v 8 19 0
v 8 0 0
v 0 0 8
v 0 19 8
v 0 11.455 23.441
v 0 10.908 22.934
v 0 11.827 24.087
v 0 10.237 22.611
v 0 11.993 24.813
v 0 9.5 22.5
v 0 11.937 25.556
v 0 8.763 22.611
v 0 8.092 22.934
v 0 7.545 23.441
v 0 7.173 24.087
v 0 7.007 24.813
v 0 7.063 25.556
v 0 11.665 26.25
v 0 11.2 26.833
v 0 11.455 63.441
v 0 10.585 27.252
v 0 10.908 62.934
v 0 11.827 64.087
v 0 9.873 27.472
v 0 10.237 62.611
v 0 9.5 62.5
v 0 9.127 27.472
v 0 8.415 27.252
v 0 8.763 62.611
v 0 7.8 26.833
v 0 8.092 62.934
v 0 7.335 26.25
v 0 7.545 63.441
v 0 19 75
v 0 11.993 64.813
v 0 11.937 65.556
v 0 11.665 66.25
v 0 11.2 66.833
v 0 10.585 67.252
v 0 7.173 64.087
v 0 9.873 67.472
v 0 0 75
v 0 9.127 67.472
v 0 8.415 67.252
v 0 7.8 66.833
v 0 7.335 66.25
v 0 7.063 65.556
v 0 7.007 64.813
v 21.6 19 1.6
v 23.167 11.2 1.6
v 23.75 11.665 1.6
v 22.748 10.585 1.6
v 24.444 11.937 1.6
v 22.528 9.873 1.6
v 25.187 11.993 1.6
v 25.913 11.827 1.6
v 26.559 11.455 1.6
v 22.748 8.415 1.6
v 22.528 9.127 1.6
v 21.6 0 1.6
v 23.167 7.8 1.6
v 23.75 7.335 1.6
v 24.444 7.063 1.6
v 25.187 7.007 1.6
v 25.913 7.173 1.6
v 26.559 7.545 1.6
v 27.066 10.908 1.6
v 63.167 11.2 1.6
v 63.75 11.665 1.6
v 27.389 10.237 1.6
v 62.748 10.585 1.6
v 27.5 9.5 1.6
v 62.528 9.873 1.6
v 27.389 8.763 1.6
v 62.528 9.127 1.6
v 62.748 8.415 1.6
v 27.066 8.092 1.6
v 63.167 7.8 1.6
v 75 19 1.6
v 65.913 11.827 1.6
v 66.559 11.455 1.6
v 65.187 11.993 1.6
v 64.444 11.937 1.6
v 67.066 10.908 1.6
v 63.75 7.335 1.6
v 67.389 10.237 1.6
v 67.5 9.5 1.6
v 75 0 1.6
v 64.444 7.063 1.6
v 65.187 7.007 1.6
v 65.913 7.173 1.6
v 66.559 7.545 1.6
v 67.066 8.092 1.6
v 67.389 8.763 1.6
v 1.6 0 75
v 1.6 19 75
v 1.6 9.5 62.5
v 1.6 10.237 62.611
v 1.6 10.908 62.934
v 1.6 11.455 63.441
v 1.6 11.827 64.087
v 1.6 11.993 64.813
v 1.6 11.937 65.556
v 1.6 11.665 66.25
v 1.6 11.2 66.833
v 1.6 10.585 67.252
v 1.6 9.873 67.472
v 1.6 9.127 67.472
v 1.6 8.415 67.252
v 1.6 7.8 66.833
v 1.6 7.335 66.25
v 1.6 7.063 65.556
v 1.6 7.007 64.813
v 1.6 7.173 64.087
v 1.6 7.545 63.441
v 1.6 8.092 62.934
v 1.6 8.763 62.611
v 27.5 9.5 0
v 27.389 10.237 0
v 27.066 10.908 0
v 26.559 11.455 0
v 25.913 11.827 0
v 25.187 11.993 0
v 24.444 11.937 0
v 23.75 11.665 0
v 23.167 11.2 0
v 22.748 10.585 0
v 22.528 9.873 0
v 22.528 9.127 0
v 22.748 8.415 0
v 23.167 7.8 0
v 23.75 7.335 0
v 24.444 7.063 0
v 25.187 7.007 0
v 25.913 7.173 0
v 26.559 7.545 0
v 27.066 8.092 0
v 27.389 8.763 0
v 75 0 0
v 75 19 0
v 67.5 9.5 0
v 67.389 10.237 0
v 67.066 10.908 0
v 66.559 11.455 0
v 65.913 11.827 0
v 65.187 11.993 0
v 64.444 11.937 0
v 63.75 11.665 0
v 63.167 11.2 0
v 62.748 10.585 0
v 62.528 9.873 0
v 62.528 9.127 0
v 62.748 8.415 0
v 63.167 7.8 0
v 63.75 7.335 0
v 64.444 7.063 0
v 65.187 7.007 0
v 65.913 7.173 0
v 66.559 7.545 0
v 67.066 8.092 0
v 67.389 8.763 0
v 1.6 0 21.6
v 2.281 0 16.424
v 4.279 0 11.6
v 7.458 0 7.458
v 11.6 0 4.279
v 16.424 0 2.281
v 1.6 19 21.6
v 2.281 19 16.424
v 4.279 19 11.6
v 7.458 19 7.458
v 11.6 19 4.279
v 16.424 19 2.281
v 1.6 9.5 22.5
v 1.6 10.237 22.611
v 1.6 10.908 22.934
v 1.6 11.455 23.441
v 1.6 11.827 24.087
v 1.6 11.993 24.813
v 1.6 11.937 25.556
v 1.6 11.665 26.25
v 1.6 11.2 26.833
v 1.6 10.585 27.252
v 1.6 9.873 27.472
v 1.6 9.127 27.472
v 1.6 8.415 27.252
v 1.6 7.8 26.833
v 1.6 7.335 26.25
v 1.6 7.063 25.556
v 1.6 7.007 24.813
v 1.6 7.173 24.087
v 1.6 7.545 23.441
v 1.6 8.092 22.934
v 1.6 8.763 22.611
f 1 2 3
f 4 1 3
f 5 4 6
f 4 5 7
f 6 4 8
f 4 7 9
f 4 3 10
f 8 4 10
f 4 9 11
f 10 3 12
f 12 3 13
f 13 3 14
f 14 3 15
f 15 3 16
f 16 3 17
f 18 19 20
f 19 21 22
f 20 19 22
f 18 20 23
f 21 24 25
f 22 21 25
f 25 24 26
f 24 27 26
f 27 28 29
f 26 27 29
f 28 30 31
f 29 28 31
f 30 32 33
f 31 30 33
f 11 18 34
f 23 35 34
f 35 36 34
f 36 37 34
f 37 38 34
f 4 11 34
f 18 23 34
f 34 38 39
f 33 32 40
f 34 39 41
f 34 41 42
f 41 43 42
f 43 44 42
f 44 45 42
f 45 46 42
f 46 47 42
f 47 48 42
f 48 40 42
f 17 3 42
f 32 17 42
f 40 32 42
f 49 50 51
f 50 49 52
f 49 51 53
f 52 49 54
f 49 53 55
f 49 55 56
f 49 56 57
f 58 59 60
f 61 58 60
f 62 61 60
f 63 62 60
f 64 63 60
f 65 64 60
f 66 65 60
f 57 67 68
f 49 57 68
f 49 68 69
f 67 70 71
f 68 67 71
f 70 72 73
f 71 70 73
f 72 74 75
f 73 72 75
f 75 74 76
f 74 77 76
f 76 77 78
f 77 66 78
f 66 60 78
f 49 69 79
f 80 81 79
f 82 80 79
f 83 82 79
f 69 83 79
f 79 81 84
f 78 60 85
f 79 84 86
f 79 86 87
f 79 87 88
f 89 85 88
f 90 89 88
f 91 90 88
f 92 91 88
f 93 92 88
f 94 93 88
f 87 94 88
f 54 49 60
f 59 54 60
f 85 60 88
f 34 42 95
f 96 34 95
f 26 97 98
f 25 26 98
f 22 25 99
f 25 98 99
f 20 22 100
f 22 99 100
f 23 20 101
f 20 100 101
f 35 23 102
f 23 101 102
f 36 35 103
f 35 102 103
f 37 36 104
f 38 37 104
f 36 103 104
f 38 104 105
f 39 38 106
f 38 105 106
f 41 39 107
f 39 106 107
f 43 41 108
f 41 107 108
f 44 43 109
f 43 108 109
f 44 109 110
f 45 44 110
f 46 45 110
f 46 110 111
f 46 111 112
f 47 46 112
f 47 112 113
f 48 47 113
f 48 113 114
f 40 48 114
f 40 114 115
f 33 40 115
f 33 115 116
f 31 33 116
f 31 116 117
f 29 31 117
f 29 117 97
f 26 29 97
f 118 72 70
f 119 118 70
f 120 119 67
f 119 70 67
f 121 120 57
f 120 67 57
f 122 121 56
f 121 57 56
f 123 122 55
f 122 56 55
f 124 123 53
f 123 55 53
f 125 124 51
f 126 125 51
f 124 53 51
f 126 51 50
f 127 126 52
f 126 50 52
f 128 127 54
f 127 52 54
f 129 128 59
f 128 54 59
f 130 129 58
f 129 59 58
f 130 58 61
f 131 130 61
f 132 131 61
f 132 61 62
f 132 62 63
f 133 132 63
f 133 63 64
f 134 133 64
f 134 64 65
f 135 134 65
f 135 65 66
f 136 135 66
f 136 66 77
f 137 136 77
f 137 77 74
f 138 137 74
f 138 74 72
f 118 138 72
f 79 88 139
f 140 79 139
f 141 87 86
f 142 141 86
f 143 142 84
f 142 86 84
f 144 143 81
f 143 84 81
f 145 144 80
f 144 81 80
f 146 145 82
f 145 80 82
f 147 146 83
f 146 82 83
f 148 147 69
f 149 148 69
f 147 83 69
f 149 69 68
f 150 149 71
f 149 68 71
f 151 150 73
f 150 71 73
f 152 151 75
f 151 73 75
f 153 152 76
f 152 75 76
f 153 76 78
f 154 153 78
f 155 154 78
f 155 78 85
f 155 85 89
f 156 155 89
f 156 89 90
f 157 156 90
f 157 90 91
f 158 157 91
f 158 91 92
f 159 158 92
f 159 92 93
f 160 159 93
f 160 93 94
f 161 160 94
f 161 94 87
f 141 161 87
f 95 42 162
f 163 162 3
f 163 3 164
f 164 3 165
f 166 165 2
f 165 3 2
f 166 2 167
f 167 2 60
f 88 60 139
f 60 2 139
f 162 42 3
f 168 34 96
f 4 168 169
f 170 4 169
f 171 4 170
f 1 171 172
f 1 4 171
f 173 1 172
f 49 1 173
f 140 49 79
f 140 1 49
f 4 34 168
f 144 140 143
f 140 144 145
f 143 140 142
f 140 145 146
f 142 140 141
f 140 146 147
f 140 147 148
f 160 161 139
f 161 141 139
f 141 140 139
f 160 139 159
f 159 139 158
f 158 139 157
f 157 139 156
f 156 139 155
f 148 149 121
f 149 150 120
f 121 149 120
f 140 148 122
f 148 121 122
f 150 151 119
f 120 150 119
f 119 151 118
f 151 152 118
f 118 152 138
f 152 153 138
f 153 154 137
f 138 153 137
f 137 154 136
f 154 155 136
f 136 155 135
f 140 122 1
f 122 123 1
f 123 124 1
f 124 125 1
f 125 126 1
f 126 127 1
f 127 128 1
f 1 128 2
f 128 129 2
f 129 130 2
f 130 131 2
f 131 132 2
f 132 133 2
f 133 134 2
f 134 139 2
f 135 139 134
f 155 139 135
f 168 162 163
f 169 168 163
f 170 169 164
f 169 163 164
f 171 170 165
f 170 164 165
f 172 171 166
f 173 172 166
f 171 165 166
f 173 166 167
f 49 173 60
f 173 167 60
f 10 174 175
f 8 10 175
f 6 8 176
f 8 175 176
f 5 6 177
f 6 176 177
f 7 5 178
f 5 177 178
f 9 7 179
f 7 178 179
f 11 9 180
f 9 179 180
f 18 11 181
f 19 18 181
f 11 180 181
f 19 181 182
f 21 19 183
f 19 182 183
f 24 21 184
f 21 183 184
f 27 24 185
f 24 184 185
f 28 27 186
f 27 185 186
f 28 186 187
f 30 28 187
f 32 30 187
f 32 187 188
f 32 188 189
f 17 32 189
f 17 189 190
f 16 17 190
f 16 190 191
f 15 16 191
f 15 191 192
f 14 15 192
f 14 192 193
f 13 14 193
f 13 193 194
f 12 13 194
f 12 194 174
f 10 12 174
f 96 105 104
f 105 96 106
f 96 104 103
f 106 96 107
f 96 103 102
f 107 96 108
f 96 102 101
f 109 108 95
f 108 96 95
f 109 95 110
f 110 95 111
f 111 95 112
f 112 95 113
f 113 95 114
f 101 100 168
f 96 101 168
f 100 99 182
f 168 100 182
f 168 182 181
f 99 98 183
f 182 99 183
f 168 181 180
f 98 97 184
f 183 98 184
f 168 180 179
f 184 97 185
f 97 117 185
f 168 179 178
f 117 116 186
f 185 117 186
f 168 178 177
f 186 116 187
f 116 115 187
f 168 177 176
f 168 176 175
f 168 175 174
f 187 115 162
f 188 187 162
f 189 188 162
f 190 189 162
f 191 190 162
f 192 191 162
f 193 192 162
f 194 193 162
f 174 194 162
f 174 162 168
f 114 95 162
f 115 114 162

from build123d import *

# Parameters (mm, degrees)
EXTRUDE_2_DEPTH     = 19
SKETCH_2_R          = 2.5
CUT_EXTRUDE_1_DEPTH = 107.646894001
SKETCH_3_R          = 2.5
CUT_EXTRUDE_2_DEPTH = 107.646894001


with BuildPart() as part:
    # 草图1 → 凸台-拉伸2 (new body)
    with BuildSketch(Plane(origin=(0, 0, 0), x_dir=(1, 0, 0), z_dir=(0, 1, 0))):
        with BuildLine():
            Line((75, 0), (8, 0))
            Line((8, 0), (0, -8))
            Line((0, -8), (0, -75))
            Line((0, -75), (1.6, -75))
            Line((1.6, -75), (1.6, -21.6))
            ThreePointArc((1.6, -21.6), (7.457864376, -7.457864376), (21.6, -1.6))
            Line((21.6, -1.6), (75, -1.6))
            Line((75, -1.6), (75, 0))
        make_face()
    extrude(amount=EXTRUDE_2_DEPTH)

    # 草图2 → 切除-拉伸1 (cut, through all)
    with BuildSketch(Plane.XY.offset(1.6)):
        with Locations((25, 9.5)):
            Circle(SKETCH_2_R)
        with Locations((65, 9.5)):
            Circle(SKETCH_2_R)
    extrude(amount=-CUT_EXTRUDE_1_DEPTH, mode=Mode.SUBTRACT)

    # 草图3 → 切除-拉伸2 (cut, through all)
    with BuildSketch(Plane(origin=(1.6, 0, 0), x_dir=(0, 0, -1), z_dir=(1, 0, 0))):
        with Locations((-65, 9.5)):
            Circle(SKETCH_3_R)
        with Locations((-25, 9.5)):
            Circle(SKETCH_3_R)
    extrude(amount=-CUT_EXTRUDE_2_DEPTH, mode=Mode.SUBTRACT)


solid = part.part
